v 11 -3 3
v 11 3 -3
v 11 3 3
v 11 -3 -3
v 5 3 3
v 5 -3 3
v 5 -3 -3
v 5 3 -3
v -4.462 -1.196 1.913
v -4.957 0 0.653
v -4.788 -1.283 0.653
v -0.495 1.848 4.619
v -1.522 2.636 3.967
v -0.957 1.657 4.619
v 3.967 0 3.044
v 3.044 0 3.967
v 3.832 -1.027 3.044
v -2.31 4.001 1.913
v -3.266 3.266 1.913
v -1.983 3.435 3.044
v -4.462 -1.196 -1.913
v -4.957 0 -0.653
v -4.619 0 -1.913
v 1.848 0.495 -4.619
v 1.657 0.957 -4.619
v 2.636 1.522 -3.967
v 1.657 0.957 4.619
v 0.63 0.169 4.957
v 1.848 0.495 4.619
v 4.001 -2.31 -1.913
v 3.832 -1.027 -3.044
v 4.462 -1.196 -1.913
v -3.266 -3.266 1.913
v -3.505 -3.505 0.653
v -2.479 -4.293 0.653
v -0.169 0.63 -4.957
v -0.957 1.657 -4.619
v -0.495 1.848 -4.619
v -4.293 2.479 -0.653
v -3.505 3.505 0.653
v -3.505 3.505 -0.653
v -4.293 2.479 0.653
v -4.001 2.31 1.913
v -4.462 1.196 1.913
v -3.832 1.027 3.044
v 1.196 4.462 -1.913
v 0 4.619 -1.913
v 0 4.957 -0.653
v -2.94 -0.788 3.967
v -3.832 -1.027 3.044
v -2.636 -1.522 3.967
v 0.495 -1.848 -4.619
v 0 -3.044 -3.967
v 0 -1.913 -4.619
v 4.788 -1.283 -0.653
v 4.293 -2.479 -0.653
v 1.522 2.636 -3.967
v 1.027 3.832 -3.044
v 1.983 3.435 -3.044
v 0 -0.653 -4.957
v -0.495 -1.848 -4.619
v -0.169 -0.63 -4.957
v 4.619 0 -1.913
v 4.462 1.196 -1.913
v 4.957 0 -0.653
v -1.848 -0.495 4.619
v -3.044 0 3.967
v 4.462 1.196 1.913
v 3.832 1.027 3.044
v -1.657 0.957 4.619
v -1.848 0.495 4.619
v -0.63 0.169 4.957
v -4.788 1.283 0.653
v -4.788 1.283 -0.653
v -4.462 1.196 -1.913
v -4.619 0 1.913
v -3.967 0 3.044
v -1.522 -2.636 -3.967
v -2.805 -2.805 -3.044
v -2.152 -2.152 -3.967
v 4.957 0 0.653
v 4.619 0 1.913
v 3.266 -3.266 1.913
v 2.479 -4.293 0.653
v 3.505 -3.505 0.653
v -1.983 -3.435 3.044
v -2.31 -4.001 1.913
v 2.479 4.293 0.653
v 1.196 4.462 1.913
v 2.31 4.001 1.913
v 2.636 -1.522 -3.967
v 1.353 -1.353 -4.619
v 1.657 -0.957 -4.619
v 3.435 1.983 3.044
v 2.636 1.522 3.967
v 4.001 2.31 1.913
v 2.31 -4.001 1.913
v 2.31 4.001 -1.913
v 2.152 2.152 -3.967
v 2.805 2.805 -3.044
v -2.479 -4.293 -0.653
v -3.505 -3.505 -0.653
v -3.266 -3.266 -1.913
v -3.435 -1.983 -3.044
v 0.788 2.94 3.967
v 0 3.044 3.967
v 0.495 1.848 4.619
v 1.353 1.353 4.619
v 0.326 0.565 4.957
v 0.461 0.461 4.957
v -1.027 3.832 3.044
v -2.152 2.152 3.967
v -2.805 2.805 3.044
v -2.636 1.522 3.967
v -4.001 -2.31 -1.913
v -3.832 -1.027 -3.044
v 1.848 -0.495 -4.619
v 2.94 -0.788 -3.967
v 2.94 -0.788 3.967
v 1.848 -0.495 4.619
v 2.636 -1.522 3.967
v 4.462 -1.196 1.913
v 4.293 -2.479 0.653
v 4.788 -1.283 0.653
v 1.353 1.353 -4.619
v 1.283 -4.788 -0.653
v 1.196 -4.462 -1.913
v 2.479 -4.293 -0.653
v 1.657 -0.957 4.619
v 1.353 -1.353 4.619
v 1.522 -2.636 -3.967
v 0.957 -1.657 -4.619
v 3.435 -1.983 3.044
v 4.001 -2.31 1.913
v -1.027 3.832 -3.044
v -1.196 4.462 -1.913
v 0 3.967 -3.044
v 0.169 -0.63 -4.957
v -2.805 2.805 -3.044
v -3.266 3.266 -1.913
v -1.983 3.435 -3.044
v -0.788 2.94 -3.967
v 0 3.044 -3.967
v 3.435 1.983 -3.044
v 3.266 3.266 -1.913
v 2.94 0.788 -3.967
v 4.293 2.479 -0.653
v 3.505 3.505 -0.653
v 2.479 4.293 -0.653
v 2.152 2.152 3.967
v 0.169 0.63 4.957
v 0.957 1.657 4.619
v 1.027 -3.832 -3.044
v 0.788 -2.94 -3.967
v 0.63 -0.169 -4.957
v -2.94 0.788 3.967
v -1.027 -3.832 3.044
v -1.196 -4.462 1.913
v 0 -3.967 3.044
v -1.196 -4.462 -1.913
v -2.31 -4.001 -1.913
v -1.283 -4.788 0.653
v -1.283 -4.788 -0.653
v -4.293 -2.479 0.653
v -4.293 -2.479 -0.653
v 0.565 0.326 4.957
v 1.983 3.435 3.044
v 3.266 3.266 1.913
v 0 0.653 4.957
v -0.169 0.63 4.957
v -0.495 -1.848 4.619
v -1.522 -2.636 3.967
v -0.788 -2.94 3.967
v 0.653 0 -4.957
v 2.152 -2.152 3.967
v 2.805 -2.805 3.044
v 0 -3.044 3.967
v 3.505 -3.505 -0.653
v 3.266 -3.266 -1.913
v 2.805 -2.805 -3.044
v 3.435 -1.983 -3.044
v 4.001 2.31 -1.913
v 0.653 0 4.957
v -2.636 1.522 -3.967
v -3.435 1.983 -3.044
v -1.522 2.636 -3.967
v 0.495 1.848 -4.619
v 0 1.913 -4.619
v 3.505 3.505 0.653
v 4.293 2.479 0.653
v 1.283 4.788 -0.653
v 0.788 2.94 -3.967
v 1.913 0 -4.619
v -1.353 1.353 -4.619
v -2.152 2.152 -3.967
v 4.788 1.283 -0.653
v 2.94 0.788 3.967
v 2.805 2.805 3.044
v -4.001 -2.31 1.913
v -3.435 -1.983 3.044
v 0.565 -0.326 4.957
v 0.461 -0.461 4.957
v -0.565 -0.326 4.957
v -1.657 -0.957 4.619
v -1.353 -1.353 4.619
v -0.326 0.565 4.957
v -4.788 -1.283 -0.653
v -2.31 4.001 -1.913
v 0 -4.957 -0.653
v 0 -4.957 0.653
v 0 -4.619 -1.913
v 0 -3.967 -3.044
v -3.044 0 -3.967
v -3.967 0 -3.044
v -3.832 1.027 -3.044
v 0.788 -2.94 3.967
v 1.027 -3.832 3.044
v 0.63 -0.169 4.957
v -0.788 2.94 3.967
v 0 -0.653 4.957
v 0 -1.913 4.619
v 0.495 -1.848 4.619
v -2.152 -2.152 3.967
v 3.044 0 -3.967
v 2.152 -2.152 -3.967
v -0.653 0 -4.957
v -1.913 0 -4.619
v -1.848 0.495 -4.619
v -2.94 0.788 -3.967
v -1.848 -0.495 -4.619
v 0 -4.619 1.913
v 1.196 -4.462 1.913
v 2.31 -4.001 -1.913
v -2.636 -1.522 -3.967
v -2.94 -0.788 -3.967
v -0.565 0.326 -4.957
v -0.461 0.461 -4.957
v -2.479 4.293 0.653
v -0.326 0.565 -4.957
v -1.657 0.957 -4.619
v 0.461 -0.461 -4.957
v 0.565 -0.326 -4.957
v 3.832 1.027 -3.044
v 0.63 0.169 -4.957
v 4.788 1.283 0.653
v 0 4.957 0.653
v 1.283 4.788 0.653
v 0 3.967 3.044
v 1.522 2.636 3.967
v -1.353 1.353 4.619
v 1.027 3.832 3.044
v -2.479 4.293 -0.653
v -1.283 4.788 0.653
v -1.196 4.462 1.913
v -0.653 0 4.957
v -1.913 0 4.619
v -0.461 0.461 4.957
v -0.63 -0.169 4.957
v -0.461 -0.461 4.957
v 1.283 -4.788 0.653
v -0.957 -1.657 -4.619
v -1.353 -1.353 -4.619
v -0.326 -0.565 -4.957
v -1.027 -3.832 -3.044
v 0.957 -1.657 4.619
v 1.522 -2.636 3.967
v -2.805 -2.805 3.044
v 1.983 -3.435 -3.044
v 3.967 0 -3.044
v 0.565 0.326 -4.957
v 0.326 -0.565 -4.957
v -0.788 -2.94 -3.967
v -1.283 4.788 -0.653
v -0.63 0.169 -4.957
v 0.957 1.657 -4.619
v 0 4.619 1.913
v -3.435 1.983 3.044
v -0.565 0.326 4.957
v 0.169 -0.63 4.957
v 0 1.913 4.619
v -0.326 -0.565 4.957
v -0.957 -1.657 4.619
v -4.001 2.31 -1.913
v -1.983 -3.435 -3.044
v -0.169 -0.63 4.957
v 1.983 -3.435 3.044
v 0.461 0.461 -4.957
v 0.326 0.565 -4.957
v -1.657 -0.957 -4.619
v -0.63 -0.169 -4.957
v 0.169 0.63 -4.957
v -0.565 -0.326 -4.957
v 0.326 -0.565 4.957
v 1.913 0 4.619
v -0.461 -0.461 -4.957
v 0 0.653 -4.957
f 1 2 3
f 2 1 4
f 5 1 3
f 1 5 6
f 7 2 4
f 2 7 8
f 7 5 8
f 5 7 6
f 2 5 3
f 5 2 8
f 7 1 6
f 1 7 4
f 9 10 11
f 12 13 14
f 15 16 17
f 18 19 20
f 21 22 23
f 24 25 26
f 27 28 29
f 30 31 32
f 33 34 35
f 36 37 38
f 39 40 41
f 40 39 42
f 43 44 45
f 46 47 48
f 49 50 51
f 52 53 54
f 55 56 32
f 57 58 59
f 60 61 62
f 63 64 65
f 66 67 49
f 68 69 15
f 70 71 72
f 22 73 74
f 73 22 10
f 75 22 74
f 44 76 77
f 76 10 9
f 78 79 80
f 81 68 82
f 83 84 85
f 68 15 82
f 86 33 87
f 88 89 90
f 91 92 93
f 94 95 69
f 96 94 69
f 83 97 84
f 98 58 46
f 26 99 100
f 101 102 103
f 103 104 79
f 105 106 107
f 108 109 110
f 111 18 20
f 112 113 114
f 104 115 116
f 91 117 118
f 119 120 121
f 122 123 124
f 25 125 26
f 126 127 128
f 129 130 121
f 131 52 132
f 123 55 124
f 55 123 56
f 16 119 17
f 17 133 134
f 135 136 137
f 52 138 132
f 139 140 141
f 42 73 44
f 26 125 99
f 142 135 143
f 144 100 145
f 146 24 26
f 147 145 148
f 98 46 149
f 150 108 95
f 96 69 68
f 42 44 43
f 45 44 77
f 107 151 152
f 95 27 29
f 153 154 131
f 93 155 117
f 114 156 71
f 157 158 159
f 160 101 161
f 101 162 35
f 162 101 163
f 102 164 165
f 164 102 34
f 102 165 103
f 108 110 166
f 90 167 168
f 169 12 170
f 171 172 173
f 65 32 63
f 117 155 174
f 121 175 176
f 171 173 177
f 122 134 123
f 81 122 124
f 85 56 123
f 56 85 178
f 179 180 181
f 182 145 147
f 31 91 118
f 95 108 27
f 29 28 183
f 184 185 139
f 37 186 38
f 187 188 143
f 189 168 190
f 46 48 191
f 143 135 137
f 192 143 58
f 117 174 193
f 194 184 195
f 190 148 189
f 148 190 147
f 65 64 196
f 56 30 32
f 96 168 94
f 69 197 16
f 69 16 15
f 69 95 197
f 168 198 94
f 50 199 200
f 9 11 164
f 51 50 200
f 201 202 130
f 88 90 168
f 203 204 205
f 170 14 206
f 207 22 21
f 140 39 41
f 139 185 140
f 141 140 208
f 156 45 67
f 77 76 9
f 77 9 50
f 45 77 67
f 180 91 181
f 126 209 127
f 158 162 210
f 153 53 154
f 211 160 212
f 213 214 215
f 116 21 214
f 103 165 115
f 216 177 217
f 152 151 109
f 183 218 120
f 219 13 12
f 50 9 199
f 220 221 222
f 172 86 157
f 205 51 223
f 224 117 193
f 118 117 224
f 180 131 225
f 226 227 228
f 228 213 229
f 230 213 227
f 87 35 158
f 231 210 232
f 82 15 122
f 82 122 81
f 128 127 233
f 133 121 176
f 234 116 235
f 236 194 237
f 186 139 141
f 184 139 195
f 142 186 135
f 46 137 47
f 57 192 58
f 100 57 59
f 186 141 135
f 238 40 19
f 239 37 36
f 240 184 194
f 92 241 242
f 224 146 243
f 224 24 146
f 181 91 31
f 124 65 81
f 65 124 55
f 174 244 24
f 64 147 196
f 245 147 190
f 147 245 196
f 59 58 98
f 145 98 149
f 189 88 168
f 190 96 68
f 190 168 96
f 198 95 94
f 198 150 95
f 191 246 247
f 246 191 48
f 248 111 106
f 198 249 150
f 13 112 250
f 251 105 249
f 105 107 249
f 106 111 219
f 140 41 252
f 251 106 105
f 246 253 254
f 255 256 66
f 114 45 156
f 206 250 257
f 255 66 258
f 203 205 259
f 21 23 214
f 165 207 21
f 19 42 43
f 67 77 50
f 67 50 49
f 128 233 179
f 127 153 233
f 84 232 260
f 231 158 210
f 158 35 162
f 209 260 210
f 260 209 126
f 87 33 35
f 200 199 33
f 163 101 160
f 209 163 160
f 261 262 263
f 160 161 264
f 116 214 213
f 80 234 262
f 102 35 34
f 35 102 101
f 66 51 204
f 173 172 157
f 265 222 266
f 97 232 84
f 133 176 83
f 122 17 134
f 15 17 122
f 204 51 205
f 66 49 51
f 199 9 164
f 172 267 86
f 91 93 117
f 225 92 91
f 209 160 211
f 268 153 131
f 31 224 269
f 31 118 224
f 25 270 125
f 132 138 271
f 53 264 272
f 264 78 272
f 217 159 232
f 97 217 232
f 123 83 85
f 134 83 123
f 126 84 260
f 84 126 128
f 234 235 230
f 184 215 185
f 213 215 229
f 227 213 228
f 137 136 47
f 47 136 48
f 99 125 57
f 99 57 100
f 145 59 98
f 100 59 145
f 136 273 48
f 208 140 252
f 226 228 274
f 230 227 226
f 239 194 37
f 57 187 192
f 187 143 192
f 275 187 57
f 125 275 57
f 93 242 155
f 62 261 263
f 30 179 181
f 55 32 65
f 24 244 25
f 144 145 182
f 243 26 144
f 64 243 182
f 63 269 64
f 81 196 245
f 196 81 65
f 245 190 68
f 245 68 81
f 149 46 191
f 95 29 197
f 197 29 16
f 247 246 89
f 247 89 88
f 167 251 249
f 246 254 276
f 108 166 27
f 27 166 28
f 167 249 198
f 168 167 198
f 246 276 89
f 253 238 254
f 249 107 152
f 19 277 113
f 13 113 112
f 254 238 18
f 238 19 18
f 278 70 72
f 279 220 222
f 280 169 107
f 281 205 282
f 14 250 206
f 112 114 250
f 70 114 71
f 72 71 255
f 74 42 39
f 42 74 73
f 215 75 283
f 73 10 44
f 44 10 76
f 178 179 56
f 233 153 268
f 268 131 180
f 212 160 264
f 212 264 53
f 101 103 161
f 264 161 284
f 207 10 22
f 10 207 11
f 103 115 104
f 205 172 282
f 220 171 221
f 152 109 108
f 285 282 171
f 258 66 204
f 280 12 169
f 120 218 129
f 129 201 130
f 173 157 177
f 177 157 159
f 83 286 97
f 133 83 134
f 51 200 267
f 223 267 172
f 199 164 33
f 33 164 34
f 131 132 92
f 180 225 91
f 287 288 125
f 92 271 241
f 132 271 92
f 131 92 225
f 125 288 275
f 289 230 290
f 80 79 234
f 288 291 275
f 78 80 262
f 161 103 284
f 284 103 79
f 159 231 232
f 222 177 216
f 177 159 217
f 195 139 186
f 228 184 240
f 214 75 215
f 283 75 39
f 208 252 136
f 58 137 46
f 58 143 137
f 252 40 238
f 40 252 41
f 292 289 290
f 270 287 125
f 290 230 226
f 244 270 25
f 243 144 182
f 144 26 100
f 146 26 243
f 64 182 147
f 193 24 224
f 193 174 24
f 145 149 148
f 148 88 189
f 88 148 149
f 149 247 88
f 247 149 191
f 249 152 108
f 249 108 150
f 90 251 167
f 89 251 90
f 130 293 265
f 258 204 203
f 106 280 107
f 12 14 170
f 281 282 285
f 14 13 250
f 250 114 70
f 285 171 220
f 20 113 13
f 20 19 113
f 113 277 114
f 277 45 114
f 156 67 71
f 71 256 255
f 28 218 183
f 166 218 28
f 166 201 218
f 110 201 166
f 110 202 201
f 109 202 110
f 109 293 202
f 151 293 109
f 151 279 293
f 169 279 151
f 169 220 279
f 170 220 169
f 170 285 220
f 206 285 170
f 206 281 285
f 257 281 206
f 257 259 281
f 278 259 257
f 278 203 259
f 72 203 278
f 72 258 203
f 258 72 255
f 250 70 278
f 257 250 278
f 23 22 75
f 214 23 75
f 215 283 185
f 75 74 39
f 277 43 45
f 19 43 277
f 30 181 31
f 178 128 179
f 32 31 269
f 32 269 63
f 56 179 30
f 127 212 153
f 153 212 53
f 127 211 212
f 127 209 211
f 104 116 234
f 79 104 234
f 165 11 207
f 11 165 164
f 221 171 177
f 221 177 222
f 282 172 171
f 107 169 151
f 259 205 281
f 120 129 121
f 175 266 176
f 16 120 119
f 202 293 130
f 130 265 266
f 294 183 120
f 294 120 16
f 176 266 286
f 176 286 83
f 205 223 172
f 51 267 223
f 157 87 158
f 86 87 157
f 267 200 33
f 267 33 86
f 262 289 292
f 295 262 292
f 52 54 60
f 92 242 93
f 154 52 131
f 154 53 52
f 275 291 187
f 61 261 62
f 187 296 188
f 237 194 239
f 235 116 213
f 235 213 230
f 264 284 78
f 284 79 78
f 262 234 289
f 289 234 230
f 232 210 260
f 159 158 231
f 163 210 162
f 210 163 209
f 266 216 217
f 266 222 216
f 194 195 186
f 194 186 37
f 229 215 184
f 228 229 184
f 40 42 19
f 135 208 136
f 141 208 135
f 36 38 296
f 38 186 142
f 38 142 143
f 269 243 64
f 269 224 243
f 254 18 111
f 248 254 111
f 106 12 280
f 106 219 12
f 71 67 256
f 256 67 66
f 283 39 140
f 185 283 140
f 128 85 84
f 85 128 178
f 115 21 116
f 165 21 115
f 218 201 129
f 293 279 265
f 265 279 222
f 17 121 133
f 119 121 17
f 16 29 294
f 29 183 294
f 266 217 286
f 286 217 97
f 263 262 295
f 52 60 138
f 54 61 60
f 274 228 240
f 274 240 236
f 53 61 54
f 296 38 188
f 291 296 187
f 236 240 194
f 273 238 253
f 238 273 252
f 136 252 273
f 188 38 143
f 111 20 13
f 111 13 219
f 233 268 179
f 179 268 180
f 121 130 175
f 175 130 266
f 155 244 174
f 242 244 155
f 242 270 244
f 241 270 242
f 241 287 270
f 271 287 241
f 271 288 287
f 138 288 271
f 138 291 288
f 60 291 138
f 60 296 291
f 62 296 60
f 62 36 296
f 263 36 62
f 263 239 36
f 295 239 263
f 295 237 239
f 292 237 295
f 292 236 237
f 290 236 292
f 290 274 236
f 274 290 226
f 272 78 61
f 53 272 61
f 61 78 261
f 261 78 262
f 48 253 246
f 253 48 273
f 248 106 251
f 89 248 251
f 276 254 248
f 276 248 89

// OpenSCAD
// Animation source for test_parallel_animation.py.
// Cheap to render but visibly different in every frame, so a dropped, duplicated
// or reordered frame changes the output rather than hiding in identical pixels.
rotate([0, 0, $t * 360]) translate([8, 0, 0]) cube(6, center = true);
sphere(r = 5, $fn = 24);
